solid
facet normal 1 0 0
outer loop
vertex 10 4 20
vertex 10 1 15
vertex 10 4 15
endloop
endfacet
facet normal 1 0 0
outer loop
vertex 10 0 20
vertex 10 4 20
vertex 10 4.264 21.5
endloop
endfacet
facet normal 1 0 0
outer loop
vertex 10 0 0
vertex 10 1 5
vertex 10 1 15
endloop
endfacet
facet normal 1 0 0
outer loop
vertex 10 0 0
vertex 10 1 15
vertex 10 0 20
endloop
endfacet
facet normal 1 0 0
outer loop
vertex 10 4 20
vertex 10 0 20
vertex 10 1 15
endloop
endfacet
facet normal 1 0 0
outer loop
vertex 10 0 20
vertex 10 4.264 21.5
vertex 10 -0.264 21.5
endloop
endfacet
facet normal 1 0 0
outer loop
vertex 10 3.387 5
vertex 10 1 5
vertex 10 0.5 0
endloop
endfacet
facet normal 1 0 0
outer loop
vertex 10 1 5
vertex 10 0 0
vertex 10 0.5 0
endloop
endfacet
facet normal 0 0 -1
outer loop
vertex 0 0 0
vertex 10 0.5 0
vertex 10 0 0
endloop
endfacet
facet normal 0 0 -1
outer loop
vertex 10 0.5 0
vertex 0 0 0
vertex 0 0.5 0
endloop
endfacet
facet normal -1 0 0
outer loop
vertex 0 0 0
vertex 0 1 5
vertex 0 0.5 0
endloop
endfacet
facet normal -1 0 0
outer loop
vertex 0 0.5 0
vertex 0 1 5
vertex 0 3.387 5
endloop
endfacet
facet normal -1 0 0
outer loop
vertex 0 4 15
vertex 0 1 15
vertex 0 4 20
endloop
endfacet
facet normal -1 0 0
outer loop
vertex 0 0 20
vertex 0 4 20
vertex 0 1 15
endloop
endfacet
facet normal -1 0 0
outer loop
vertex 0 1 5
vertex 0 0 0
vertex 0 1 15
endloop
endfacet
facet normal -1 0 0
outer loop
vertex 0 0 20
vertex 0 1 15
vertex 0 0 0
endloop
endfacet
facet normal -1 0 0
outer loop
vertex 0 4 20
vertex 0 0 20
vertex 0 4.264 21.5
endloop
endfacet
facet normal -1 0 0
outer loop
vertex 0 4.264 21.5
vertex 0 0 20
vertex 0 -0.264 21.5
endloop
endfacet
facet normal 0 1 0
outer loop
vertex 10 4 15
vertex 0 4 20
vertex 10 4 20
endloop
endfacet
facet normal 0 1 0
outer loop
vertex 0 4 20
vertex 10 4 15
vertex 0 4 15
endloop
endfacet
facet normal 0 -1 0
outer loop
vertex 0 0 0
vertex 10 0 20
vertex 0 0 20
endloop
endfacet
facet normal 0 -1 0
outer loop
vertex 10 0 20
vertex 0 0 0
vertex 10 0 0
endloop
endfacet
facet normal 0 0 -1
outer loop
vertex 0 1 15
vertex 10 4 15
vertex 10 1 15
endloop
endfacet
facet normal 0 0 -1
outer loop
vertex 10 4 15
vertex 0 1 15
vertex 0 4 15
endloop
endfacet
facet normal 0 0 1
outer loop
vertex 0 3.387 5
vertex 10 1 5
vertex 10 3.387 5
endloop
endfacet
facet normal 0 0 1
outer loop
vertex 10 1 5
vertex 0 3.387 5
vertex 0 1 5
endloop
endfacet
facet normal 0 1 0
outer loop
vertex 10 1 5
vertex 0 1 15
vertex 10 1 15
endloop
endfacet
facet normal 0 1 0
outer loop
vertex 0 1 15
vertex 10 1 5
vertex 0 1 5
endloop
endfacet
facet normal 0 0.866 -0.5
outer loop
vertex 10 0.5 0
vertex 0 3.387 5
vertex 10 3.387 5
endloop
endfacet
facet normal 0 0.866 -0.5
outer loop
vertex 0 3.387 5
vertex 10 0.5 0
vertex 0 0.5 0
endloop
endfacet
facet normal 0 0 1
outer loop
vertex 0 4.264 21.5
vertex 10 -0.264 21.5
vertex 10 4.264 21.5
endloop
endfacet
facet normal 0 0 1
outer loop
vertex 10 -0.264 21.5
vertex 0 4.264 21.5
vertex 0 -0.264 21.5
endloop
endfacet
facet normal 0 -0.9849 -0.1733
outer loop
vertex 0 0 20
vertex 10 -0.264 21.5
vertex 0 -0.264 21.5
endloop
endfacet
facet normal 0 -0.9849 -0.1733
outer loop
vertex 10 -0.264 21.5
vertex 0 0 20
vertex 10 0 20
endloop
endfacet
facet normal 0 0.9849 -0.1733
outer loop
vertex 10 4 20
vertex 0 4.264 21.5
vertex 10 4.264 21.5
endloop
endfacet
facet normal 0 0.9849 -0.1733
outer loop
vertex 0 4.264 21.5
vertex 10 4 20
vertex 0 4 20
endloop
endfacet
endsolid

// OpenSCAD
$fn = 120;

union() {
	difference() {
		cube(size = [10, 4, 20.5]);
		translate(v = [-0.25, 1, 5]) {
			cube(size = [10.5, 10, 10]);
		}
		translate(v = [-0.25, 0.5, 0]) {
			rotate(a = [-30, 0, 0]) {
				cube(size = [10.5, 5, 10]);
			}
		}
	}
	translate(v = [0, 0, 20]) {
		difference() {
			translate(v = [0, -1, -0.0]) {
				cube(size = [10, 6, 1.5]);
			}
			rotate(a = [10, 0, 0]) {
				translate(v = [-0.25, -2, 0]) {
					cube(size = [10.5, 2, 2]);
				}
			}
			translate(v = [-0.25, 4, 0]) {
				rotate(a = [-10, 0, 0]) {
					cube(size = [10.5, 2, 2]);
				}
			}
		}
	}
}
